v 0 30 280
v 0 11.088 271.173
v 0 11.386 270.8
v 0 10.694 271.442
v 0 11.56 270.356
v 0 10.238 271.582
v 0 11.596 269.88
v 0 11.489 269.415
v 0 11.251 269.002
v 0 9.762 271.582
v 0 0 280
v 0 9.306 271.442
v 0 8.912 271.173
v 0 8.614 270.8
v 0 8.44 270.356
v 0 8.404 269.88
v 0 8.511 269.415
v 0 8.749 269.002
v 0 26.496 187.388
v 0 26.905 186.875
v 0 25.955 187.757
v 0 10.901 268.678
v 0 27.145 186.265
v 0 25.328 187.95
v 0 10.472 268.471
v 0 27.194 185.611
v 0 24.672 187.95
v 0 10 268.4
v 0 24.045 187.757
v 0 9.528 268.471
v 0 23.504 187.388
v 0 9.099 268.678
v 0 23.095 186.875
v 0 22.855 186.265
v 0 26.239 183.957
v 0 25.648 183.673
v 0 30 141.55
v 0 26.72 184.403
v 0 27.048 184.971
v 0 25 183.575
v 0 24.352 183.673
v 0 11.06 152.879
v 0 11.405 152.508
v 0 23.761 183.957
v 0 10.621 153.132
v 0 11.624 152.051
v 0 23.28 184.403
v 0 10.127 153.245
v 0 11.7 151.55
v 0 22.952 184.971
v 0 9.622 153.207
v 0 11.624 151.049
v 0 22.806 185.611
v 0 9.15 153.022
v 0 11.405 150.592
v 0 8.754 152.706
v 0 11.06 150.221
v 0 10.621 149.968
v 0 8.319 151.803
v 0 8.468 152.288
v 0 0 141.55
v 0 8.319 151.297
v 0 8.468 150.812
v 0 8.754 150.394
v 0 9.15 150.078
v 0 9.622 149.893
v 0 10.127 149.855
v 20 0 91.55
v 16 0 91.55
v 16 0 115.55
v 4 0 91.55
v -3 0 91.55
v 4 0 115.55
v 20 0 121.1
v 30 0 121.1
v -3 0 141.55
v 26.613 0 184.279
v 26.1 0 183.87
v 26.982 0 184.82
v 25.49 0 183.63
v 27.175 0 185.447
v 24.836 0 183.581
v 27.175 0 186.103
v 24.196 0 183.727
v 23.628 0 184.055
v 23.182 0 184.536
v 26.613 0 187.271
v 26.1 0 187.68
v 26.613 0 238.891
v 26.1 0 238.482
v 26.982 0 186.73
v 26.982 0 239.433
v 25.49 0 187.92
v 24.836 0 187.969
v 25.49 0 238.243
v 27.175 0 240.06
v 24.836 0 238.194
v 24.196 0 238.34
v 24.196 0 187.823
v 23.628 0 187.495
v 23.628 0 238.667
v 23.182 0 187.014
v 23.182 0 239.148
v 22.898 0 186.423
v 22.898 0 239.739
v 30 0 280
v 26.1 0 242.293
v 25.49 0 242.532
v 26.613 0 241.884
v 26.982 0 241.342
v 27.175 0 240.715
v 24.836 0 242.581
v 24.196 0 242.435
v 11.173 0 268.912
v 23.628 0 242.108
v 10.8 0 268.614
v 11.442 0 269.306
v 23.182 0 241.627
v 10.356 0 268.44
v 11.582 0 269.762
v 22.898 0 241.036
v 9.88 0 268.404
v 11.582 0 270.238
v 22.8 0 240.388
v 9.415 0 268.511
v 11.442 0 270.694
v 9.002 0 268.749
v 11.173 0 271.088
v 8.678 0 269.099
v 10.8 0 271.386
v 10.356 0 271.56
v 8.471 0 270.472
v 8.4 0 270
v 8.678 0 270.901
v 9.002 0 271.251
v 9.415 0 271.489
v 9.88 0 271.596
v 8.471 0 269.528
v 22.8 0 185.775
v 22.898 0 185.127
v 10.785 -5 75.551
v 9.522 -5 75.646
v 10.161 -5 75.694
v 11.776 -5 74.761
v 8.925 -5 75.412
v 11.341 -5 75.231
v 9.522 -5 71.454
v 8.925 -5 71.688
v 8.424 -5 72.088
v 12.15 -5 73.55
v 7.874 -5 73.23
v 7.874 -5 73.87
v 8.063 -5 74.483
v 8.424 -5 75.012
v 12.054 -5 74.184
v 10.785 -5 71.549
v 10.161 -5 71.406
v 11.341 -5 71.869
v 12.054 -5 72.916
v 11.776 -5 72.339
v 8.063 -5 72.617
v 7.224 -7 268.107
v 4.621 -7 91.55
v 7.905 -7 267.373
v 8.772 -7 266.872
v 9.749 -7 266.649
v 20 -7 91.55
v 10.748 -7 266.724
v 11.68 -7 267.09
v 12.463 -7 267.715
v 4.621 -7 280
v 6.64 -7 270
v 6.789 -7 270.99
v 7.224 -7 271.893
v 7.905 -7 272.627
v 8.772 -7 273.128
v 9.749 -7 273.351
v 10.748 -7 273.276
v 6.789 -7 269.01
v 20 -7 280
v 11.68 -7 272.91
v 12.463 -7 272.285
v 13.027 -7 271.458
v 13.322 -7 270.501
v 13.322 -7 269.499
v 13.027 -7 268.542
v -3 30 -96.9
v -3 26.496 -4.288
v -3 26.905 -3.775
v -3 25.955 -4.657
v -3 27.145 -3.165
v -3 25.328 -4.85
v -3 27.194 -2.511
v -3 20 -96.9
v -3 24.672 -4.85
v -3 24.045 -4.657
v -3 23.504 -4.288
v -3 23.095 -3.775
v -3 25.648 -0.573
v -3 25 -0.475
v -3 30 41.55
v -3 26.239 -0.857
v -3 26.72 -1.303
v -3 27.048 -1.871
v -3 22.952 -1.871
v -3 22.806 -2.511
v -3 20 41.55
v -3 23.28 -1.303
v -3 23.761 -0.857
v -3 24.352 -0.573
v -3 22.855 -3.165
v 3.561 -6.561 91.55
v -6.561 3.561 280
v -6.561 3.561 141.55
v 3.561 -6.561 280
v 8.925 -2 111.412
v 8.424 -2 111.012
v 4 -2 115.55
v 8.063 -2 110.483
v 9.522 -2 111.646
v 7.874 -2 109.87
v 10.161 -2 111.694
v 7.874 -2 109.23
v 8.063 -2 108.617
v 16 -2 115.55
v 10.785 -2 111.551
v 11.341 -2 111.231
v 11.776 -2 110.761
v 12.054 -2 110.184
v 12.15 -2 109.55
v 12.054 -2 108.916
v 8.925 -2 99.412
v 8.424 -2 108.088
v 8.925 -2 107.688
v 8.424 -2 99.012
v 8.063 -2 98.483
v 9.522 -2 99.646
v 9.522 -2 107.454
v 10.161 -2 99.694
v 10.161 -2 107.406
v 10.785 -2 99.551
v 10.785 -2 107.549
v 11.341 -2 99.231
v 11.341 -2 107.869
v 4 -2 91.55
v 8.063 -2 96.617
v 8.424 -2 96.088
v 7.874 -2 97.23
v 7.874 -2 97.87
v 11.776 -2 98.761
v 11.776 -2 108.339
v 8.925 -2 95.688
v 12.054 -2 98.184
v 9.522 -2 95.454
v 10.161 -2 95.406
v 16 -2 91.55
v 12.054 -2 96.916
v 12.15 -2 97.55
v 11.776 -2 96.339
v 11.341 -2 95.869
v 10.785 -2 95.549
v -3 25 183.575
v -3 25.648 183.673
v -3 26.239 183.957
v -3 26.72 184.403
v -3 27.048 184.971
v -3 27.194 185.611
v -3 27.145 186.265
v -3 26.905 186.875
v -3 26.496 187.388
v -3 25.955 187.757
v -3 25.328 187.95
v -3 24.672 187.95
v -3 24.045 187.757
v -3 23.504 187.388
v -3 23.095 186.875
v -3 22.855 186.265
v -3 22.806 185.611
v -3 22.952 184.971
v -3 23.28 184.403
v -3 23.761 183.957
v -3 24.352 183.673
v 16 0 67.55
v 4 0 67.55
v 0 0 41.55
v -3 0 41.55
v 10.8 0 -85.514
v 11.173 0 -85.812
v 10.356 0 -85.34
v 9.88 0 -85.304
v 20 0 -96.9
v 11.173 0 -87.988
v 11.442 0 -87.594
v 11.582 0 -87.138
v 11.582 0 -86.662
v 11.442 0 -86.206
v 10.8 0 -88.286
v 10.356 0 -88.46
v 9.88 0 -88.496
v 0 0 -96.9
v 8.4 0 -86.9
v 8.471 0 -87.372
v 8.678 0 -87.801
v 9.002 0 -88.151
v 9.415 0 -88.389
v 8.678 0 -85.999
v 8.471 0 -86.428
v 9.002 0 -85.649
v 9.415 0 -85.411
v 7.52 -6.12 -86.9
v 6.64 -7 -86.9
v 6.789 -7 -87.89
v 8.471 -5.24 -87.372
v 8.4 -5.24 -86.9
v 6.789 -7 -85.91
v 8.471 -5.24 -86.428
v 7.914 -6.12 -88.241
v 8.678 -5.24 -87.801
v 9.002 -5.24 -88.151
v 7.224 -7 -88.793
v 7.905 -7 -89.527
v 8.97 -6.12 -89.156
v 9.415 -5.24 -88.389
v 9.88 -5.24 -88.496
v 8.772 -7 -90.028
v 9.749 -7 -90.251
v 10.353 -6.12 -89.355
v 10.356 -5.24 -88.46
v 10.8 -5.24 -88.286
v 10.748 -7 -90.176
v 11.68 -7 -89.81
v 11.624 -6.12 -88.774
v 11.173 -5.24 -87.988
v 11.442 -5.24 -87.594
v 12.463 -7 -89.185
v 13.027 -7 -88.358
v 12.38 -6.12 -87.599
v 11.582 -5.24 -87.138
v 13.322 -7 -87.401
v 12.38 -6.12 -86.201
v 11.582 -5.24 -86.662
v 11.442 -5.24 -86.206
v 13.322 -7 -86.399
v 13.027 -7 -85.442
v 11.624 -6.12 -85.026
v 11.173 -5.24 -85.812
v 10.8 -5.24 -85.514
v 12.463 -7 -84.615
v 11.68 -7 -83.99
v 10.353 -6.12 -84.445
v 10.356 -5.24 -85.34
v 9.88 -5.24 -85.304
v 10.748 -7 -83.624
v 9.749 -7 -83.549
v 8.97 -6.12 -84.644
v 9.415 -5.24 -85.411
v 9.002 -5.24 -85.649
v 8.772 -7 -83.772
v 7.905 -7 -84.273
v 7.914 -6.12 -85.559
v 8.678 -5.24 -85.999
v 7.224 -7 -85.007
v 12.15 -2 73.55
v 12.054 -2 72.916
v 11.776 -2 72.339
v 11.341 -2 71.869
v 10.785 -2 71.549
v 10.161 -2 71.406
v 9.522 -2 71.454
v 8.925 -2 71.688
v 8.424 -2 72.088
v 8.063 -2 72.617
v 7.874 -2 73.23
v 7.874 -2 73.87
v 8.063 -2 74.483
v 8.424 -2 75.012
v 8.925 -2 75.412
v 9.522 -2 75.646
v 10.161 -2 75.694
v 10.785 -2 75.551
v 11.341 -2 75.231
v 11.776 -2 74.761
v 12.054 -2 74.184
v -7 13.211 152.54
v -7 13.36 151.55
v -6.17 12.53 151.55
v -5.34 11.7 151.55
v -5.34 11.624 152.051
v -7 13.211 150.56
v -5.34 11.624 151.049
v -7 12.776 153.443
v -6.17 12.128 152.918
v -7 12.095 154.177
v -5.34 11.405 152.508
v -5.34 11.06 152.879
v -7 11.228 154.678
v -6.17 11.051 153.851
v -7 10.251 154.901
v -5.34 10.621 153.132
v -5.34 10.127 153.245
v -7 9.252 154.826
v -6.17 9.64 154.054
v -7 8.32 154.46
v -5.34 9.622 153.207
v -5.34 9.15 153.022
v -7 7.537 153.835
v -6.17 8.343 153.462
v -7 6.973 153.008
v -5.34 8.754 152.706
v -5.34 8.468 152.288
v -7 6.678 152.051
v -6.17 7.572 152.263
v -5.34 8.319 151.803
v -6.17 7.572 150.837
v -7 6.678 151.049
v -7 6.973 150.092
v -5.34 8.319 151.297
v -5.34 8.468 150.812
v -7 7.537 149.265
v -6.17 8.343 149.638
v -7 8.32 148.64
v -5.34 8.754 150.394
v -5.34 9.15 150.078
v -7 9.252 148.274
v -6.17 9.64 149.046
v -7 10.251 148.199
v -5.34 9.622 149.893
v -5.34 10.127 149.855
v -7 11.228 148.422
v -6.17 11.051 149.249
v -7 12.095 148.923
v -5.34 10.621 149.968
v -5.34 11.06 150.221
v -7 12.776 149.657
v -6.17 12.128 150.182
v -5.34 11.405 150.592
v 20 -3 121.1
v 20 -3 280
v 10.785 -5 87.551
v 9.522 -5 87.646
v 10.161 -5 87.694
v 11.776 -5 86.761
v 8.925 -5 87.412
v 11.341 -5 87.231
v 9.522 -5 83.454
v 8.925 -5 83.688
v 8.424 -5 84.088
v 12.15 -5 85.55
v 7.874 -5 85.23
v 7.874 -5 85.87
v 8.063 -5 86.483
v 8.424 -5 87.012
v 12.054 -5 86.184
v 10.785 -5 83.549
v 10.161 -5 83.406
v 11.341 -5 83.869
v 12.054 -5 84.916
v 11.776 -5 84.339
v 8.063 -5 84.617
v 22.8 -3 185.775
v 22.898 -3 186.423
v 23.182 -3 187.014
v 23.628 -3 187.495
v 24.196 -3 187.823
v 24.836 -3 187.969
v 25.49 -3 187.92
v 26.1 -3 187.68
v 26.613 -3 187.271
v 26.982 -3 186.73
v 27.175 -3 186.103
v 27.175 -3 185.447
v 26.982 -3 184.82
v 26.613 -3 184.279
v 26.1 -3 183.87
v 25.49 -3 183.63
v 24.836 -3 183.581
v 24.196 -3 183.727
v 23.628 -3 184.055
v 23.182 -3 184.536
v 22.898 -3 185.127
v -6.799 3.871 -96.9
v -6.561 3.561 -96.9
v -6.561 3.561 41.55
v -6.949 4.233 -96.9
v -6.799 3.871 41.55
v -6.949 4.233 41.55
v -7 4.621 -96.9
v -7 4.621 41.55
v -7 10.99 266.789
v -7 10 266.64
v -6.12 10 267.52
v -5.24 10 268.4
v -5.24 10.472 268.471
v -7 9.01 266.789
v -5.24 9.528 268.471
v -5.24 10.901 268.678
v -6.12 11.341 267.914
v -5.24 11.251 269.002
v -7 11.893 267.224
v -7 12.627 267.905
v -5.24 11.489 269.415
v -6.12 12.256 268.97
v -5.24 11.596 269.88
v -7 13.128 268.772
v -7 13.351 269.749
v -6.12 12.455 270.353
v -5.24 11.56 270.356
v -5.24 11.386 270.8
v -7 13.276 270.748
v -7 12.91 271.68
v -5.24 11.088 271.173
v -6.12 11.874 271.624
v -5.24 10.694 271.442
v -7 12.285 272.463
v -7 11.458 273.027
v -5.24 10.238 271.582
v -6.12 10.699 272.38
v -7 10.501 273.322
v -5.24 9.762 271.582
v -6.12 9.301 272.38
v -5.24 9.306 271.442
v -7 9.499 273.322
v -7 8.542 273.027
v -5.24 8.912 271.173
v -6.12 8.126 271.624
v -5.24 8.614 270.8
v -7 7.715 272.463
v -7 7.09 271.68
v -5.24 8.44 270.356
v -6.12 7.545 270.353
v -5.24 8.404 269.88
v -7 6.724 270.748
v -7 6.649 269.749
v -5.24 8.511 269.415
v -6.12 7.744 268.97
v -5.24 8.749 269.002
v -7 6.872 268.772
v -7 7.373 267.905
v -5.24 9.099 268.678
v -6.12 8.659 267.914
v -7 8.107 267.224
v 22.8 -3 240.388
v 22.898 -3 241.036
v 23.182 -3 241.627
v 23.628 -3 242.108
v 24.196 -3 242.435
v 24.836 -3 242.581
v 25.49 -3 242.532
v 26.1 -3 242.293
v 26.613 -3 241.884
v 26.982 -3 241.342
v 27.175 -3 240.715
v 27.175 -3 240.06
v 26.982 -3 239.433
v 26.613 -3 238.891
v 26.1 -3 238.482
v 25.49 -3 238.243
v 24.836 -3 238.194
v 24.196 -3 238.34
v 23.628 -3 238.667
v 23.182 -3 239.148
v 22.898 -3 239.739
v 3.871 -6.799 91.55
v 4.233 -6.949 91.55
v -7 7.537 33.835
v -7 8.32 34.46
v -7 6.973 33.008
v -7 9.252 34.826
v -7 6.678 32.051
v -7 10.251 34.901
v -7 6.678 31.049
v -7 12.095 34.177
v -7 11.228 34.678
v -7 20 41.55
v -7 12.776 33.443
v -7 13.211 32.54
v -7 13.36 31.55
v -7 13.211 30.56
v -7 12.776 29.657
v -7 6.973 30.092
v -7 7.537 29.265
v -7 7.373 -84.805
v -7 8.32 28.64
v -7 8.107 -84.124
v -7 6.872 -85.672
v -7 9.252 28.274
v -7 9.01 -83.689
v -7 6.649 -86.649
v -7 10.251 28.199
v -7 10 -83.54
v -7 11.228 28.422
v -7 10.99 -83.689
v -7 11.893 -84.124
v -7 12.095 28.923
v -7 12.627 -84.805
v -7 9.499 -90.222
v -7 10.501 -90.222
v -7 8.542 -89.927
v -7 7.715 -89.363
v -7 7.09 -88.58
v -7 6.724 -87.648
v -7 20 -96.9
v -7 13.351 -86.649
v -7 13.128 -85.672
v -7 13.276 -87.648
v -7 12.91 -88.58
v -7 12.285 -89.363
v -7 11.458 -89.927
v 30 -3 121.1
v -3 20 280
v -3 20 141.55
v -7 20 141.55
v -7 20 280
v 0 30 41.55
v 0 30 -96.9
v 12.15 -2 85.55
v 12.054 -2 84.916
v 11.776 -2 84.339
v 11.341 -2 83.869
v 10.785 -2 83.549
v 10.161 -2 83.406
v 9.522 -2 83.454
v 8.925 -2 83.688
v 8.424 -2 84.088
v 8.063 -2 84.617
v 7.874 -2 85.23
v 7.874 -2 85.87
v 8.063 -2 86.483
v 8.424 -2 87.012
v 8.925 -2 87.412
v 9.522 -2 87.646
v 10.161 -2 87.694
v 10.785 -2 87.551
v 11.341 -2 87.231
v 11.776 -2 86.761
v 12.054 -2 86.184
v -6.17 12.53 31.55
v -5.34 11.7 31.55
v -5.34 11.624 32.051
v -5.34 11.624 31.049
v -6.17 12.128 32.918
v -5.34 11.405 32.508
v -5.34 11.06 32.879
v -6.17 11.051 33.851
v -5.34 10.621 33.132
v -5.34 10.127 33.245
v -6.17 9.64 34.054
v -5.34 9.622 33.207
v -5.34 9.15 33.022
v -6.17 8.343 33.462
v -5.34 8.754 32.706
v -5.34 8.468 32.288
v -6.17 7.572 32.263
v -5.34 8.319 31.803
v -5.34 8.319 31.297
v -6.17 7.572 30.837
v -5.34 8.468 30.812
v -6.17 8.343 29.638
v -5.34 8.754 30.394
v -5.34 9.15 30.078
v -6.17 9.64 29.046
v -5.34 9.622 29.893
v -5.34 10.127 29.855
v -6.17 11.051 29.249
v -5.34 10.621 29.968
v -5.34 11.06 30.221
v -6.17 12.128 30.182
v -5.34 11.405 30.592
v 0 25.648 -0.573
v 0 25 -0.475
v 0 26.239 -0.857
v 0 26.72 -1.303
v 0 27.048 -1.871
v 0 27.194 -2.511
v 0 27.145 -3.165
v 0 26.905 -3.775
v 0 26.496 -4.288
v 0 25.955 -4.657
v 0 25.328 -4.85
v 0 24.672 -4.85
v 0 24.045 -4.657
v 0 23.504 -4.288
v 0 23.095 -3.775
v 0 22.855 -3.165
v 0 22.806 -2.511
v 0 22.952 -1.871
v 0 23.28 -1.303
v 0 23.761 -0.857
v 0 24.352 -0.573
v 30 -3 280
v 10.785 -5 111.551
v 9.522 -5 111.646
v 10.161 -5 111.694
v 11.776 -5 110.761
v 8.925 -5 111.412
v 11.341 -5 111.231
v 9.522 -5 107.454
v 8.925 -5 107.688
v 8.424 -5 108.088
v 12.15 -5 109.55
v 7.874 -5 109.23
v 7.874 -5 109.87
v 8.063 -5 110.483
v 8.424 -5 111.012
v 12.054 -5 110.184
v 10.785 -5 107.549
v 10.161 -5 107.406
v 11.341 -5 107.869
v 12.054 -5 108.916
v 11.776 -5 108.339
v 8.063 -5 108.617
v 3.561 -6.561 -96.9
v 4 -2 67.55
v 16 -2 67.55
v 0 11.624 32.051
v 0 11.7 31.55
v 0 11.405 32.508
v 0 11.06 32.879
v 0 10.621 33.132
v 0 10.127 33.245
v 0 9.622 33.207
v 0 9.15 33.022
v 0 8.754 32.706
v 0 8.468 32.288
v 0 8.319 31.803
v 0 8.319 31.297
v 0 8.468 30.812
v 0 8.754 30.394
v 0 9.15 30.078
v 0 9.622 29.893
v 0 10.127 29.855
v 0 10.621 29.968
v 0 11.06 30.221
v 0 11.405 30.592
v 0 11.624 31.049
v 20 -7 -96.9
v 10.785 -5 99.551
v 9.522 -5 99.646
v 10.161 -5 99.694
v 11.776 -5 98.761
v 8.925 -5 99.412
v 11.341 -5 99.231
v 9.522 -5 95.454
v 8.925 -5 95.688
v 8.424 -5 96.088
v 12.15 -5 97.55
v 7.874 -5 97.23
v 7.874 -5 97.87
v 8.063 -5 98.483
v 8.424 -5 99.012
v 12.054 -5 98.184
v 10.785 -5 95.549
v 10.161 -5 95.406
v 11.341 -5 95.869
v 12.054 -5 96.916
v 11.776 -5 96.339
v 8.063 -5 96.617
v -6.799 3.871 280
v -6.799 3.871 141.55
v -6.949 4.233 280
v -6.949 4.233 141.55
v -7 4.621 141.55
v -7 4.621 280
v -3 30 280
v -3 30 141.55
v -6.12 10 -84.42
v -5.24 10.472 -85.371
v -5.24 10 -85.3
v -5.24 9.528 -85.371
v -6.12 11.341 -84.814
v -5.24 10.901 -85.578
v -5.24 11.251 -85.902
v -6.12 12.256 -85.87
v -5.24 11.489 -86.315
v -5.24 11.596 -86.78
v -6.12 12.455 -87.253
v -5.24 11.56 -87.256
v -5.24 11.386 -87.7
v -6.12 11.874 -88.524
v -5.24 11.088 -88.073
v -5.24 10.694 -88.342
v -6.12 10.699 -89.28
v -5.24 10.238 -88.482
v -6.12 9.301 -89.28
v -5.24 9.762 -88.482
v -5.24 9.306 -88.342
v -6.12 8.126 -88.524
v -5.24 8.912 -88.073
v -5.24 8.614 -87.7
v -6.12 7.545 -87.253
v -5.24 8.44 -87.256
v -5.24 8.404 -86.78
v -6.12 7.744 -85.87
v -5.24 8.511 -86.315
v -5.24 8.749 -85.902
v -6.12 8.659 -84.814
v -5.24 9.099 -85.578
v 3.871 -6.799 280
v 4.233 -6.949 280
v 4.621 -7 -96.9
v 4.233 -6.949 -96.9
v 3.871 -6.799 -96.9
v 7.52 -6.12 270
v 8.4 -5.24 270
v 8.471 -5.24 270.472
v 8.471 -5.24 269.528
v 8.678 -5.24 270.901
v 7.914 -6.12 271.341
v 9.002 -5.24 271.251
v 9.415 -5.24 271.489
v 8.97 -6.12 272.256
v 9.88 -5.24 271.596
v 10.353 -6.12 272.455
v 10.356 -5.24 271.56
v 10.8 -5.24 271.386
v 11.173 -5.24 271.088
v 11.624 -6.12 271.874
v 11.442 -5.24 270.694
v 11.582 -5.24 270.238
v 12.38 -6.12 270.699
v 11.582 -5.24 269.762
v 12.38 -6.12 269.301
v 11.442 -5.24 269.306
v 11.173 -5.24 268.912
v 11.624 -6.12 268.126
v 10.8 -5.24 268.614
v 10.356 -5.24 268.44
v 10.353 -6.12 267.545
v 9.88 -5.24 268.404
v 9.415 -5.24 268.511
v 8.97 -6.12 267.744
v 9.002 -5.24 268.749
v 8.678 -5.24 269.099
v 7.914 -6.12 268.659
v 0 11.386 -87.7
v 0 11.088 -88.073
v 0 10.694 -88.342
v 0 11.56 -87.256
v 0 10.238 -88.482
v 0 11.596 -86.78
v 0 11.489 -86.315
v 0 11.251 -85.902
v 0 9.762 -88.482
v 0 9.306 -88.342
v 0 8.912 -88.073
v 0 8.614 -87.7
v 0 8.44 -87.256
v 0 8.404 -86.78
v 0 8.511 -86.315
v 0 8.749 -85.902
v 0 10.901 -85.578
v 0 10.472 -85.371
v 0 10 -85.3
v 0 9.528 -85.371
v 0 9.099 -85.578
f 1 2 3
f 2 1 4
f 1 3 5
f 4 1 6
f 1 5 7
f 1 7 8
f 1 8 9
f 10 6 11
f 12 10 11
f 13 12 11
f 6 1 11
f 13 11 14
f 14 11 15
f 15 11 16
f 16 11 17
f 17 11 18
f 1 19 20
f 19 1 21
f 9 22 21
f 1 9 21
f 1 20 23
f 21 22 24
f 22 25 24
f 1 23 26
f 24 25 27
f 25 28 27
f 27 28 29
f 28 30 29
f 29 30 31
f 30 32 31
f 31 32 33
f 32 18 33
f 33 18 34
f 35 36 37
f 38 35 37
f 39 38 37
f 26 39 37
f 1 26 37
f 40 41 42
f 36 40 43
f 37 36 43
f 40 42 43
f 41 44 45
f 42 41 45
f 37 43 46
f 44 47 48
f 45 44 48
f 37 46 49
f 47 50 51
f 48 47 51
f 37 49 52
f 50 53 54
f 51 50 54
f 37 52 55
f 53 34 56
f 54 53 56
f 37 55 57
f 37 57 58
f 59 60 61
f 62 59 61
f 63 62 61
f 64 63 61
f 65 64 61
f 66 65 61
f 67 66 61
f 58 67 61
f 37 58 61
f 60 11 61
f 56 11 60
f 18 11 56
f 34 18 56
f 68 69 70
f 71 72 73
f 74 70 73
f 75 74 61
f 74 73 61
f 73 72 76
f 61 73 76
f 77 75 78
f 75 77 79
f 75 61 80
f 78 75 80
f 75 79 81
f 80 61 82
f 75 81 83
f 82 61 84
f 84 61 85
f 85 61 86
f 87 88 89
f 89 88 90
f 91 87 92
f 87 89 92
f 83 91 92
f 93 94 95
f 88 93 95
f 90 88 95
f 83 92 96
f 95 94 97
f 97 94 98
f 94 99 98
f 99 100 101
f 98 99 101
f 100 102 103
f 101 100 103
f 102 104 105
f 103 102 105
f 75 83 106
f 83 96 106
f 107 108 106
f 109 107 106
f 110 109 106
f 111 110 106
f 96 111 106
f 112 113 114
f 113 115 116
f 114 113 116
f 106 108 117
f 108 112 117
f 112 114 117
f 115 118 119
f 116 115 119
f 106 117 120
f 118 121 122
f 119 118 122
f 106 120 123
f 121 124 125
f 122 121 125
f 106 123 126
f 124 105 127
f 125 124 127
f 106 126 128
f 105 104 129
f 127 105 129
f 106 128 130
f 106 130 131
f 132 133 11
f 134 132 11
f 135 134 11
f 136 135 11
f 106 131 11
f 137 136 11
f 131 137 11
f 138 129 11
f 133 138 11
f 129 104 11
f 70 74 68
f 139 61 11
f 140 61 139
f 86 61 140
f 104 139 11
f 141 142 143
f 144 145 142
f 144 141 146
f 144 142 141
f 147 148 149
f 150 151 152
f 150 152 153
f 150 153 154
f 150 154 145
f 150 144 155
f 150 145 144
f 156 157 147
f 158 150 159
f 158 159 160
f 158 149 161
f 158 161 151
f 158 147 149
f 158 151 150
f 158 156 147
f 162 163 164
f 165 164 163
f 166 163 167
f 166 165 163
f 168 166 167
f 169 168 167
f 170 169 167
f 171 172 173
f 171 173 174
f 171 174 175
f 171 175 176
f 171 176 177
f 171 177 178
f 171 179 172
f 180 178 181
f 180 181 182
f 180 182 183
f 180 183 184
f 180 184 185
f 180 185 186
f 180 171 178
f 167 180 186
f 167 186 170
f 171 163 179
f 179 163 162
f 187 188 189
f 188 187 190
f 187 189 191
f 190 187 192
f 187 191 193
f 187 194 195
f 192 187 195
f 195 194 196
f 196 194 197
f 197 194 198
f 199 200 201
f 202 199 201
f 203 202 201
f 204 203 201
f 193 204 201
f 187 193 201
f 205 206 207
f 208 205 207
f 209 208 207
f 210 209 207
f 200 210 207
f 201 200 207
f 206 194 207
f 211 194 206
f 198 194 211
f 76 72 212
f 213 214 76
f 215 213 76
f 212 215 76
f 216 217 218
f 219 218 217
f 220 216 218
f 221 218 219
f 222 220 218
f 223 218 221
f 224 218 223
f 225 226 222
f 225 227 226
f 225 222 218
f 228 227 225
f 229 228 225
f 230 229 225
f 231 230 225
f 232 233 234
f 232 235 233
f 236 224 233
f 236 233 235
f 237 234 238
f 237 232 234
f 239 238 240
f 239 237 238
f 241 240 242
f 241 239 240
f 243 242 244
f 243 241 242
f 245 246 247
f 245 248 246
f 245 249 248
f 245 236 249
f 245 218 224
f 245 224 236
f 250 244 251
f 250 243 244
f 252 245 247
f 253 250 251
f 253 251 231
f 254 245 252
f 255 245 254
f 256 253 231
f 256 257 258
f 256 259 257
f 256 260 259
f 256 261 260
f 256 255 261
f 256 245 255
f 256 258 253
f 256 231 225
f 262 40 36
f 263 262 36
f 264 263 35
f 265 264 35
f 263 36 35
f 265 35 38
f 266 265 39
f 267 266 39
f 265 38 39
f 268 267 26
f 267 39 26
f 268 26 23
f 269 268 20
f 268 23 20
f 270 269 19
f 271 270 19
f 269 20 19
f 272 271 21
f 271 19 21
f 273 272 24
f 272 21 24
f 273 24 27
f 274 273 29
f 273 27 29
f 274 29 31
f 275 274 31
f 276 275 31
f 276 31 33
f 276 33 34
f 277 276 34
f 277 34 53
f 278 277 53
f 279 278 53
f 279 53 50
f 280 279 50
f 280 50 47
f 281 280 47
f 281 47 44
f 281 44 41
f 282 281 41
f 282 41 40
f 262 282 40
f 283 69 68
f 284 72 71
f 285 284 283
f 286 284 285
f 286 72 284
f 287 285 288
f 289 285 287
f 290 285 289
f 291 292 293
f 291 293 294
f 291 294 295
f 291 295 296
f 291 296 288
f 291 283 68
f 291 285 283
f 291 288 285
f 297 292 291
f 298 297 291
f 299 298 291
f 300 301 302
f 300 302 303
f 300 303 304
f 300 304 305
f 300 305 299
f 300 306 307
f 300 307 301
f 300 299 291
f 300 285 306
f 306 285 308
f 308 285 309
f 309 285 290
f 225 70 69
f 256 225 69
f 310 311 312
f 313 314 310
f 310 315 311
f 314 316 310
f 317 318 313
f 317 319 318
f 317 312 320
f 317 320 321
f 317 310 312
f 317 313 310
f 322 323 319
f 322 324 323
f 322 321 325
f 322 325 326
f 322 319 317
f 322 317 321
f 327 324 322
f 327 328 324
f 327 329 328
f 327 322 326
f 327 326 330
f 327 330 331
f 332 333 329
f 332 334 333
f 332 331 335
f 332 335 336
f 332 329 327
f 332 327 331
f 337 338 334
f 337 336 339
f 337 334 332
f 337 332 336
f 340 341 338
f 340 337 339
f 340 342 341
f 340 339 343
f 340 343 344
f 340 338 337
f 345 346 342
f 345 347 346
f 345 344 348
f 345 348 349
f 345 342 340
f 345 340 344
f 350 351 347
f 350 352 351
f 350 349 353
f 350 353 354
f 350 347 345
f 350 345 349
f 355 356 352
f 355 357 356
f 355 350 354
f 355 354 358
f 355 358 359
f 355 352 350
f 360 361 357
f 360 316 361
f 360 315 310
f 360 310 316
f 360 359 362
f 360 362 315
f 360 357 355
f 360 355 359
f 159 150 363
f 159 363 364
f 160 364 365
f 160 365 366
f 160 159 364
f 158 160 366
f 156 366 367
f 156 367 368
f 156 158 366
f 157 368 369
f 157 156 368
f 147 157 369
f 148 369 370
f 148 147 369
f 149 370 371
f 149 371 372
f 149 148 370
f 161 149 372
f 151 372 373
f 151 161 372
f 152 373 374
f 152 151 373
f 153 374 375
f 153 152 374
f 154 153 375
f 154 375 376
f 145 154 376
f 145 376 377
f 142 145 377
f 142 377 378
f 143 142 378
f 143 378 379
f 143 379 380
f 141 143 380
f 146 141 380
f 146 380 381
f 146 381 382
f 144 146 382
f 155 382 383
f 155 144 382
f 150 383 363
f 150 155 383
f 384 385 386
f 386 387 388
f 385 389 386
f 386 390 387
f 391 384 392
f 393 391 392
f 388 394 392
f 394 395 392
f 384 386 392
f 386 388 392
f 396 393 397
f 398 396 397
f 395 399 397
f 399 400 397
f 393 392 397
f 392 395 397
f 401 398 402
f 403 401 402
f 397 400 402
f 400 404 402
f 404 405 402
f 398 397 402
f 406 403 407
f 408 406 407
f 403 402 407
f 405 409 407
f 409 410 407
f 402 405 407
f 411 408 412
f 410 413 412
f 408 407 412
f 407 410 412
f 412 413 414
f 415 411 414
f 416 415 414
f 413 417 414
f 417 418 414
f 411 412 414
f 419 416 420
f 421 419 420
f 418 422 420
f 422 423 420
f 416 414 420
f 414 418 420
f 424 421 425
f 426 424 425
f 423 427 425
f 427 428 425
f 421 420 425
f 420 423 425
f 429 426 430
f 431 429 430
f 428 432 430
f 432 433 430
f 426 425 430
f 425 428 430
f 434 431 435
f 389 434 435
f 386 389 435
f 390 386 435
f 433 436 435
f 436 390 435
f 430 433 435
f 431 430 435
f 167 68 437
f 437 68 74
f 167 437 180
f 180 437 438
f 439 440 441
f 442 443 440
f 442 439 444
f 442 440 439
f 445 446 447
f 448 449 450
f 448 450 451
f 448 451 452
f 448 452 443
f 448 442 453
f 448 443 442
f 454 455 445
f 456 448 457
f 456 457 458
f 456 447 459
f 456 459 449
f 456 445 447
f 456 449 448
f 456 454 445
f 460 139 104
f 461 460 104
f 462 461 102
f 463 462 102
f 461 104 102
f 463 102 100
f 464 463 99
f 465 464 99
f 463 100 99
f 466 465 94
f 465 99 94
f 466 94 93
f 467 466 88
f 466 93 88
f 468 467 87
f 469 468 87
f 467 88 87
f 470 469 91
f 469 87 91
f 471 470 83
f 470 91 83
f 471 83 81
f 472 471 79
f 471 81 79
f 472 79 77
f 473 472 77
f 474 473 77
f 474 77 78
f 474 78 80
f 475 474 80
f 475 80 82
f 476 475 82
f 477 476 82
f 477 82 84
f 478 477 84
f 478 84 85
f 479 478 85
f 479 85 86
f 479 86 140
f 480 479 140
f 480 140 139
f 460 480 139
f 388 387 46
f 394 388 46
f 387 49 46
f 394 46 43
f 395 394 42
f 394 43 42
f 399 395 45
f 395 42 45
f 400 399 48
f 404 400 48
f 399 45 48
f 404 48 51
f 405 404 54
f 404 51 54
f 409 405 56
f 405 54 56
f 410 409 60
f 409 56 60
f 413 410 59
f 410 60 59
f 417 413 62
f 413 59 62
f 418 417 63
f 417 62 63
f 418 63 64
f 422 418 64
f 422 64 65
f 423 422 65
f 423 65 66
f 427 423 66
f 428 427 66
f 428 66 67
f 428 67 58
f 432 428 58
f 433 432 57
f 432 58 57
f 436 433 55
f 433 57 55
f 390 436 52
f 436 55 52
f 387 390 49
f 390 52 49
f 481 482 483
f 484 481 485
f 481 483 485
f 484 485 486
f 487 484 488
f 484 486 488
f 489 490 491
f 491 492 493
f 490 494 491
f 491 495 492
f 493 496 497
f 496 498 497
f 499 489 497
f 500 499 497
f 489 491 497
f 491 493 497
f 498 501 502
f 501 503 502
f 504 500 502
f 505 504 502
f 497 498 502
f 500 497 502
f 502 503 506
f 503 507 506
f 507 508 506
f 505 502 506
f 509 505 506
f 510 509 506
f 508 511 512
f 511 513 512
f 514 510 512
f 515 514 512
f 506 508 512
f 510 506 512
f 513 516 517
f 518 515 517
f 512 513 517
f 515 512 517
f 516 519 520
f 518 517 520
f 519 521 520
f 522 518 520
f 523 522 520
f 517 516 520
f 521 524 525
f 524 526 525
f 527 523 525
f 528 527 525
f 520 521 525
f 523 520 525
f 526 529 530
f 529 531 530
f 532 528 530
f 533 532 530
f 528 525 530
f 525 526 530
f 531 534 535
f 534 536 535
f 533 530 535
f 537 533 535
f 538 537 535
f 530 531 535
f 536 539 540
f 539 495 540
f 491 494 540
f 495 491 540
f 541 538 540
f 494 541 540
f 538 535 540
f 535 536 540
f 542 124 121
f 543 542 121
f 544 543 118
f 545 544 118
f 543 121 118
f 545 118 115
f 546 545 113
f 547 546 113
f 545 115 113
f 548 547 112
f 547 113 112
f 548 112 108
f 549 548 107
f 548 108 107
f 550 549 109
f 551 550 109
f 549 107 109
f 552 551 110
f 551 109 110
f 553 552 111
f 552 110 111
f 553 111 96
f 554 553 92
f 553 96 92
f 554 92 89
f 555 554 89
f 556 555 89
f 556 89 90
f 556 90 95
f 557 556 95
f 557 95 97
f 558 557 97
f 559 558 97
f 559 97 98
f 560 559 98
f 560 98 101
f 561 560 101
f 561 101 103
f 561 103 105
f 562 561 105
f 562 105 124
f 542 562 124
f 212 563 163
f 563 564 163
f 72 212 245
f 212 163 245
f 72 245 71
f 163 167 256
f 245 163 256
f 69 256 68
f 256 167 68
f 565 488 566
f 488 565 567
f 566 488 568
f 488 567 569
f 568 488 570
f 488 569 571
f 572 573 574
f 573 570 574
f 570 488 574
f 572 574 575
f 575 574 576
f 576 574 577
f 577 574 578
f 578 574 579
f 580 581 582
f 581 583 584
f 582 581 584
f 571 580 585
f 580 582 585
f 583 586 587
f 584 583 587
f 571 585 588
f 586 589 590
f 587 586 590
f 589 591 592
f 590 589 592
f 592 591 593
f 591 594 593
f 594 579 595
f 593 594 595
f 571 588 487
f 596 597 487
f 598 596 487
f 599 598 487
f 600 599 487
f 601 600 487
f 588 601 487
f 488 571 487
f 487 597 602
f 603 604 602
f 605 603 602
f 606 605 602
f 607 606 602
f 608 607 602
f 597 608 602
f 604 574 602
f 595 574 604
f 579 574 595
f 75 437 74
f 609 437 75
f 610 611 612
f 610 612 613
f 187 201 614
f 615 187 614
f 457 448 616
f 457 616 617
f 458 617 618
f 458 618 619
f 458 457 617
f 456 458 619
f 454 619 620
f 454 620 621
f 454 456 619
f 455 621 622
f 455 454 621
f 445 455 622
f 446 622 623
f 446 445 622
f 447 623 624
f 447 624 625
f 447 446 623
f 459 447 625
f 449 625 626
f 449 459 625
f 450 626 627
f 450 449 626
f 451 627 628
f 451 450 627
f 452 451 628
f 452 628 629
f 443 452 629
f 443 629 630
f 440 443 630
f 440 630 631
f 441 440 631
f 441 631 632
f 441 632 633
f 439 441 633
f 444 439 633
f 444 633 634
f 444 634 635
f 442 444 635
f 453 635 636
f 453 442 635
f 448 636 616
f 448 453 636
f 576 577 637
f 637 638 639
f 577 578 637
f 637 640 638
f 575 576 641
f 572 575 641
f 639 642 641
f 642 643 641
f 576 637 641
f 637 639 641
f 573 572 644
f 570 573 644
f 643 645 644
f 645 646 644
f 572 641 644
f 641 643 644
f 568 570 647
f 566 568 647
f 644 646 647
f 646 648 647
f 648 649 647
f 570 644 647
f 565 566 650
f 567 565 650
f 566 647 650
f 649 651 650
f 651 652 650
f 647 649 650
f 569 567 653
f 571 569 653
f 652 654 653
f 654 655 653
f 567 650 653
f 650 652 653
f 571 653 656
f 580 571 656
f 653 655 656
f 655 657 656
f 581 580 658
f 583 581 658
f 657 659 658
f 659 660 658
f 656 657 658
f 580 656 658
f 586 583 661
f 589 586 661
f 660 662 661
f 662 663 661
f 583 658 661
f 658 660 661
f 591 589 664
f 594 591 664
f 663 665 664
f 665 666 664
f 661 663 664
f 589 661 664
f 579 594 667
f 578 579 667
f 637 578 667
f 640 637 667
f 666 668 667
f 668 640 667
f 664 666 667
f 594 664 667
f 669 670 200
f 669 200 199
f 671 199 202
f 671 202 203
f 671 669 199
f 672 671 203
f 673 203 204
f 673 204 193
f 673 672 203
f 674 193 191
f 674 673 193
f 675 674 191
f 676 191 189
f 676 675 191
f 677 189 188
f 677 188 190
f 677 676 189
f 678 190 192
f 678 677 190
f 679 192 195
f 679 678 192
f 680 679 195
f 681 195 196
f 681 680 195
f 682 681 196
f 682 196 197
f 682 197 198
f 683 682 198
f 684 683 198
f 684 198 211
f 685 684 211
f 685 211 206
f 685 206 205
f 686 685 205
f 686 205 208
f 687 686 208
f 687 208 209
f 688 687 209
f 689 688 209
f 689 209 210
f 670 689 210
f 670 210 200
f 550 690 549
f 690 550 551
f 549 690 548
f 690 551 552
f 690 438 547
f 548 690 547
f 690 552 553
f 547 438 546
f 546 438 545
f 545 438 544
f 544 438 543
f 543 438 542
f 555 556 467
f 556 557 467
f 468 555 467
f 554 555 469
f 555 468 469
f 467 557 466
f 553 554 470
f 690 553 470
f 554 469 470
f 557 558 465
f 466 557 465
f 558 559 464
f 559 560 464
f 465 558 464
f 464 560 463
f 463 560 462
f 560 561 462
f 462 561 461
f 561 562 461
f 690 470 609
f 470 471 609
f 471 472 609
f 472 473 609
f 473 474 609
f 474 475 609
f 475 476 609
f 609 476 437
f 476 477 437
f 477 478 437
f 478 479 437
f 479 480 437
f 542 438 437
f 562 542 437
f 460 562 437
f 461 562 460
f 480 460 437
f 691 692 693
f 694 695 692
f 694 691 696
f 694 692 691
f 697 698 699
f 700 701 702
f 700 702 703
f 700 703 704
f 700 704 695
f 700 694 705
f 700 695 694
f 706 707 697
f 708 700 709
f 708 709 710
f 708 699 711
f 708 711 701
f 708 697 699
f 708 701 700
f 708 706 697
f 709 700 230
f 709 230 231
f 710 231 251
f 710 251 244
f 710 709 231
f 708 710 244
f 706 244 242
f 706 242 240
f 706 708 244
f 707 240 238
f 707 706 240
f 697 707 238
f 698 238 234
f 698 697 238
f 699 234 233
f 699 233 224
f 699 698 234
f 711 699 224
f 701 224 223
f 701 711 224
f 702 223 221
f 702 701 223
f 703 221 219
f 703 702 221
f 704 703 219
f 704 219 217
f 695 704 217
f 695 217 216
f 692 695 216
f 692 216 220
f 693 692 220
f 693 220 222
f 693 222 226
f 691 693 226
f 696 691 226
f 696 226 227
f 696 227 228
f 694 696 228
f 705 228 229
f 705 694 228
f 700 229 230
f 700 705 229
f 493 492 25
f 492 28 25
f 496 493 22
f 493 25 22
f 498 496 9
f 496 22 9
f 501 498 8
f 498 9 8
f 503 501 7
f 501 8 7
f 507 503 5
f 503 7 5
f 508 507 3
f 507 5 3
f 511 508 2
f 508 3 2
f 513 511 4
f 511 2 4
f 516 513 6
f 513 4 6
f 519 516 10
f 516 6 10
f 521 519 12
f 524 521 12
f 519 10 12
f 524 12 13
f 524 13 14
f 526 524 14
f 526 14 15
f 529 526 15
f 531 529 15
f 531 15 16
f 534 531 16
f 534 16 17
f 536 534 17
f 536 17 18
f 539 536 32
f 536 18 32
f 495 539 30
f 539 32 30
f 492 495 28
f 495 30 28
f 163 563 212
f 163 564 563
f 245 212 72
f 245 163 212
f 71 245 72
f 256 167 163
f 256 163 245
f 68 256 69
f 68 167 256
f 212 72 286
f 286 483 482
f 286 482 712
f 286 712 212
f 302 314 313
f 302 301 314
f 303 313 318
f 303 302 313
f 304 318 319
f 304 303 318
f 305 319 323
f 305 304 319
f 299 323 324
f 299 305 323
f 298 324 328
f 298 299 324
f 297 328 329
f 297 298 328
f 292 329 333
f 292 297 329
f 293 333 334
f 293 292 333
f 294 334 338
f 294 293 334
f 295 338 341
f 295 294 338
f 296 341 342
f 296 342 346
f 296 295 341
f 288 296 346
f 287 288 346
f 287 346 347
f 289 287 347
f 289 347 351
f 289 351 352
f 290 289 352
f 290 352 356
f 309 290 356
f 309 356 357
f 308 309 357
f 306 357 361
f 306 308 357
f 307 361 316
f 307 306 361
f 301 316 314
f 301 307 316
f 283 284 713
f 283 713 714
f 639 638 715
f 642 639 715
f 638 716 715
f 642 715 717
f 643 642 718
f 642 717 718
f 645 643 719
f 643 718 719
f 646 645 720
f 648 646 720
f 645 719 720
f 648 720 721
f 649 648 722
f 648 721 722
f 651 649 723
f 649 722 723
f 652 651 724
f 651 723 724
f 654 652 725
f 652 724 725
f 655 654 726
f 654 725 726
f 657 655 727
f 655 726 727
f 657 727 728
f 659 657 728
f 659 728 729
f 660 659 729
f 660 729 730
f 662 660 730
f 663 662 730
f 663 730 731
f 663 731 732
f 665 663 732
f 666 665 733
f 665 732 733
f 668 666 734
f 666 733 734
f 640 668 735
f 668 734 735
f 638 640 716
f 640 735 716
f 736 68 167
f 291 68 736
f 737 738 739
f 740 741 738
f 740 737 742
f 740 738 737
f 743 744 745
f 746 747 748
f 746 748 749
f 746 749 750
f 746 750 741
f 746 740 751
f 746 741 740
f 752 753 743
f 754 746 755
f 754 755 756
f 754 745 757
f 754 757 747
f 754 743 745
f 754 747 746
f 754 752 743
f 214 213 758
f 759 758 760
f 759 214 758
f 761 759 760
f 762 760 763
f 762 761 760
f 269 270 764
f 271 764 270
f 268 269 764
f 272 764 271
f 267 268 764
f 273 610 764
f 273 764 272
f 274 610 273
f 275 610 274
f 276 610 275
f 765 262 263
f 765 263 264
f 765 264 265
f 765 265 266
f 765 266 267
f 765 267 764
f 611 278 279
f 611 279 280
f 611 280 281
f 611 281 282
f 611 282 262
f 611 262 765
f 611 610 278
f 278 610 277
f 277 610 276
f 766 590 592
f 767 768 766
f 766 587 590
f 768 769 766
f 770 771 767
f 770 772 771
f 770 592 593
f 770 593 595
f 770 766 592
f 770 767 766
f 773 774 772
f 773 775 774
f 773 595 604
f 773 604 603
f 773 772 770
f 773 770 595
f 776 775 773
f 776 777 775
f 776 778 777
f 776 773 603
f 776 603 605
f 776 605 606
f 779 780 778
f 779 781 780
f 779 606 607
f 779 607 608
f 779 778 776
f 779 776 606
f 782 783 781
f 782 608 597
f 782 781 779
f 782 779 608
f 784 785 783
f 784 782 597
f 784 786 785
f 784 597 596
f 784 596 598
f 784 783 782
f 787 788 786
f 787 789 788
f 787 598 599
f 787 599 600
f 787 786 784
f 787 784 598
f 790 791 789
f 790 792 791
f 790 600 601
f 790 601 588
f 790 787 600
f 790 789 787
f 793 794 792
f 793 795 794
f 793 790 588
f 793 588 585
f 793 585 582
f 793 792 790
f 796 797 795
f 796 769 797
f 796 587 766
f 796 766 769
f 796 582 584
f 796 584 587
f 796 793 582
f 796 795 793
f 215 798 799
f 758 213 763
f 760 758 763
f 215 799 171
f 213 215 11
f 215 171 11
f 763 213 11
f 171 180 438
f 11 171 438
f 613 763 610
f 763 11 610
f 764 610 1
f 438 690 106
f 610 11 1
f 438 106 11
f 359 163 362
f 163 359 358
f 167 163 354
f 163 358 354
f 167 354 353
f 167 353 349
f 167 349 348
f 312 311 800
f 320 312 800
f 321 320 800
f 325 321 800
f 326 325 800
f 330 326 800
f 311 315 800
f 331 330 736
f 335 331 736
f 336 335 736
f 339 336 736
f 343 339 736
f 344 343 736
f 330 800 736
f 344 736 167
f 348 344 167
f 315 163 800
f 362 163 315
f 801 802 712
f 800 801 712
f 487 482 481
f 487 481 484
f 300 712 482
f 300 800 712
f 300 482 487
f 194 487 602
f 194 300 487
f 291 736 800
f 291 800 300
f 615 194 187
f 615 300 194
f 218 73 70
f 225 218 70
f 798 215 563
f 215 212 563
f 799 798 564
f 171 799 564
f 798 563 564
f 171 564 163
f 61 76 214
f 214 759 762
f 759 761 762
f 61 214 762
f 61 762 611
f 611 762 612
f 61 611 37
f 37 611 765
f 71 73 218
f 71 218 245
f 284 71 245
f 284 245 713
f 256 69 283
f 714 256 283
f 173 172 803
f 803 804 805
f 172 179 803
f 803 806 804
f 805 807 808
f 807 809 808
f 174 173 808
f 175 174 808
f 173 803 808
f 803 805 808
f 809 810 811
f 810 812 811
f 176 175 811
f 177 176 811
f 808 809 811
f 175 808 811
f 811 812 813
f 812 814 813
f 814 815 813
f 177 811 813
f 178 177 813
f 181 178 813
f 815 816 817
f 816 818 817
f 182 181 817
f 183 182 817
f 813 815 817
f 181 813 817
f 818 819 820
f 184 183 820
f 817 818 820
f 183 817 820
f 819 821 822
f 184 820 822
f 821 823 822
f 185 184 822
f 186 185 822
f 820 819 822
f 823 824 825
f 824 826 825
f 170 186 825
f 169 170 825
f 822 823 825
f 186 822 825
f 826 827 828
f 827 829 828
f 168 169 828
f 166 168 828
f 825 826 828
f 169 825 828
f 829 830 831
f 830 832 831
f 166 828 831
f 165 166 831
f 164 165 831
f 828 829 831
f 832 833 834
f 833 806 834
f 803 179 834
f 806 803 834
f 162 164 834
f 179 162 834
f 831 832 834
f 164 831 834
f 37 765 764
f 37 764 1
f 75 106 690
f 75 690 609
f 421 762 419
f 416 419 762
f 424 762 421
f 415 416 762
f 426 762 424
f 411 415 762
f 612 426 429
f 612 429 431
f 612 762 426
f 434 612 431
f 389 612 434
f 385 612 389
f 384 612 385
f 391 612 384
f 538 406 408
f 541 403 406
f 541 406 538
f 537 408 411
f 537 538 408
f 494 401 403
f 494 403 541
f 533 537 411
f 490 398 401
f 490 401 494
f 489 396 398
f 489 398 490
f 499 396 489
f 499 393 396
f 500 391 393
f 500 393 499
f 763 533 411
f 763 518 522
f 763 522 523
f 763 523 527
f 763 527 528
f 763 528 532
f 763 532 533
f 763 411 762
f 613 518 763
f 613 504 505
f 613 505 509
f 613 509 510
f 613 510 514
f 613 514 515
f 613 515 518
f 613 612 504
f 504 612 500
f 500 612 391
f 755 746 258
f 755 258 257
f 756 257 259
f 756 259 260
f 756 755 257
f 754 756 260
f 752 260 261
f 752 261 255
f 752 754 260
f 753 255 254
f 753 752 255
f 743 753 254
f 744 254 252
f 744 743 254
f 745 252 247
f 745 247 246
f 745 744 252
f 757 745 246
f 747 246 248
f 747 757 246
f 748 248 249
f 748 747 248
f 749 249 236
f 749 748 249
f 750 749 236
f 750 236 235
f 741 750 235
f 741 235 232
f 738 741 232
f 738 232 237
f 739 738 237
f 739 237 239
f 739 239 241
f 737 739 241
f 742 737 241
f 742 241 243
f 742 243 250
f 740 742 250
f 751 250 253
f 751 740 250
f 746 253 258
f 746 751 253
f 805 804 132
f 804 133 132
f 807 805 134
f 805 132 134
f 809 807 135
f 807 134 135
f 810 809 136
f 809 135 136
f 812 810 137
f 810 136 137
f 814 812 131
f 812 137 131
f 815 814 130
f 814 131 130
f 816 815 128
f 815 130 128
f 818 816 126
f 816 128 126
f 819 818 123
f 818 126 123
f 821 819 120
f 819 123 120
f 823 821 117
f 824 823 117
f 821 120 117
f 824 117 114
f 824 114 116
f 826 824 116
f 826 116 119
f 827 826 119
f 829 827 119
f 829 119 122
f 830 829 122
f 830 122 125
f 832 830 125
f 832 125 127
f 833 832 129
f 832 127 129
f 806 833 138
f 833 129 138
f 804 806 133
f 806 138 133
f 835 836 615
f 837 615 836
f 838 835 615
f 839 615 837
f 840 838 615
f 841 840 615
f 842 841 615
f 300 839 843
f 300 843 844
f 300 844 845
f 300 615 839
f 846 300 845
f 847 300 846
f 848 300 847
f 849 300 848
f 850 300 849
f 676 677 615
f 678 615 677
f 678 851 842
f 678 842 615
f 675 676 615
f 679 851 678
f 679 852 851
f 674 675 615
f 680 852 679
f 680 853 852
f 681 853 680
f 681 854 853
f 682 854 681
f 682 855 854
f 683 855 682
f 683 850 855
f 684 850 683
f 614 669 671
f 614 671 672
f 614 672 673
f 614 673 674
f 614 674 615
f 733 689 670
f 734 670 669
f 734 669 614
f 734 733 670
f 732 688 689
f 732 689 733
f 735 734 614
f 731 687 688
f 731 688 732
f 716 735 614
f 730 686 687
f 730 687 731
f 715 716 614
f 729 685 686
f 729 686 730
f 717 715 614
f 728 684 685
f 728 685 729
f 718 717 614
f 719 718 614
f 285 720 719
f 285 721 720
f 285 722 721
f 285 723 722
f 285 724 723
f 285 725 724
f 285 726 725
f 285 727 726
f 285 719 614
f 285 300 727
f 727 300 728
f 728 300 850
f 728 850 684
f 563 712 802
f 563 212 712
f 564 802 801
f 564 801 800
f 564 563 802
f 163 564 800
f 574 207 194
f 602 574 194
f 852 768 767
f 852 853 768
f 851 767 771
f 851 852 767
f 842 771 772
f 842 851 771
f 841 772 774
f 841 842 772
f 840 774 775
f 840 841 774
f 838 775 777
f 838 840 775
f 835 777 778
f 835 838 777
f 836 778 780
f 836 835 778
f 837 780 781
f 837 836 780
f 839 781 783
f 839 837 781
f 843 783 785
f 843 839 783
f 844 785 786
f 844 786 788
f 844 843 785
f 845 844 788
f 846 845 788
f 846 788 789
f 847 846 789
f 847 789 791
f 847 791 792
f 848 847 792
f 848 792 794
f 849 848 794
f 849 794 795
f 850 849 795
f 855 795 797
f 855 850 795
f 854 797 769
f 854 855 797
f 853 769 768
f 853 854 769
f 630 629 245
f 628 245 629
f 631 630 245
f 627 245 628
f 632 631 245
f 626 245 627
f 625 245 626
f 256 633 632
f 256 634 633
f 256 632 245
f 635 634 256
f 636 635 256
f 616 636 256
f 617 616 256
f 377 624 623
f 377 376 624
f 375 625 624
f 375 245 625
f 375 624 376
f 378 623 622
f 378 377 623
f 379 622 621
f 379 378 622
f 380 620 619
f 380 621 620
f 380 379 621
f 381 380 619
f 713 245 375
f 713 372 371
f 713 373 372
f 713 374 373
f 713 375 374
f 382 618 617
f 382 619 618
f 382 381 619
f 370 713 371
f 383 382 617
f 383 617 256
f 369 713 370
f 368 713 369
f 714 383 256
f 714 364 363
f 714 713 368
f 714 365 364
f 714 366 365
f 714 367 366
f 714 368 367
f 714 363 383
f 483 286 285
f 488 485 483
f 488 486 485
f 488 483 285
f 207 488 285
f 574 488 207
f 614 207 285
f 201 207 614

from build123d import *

# Parameters (mm, degrees)
BOSS_EXTRUDE1_DEPTH                  = 188.45
FILLET1_R                            = 1.5
SKETCH6_W                            = 188.45
SKETCH6_H                            = 3
BOSS_EXTRUDE2_DEPTH                  = 10
SKETCH7_W                            = 13
SKETCH7_H                            = 188.45
BOSS_EXTRUDE3_DEPTH                  = 4
SKETCH8_W                            = 3
SKETCH8_H                            = 188.45
BOSS_EXTRUDE4_DEPTH                  = 10
SKETCH9_W                            = 188.45
SKETCH9_H                            = 13
BOSS_EXTRUDE5_DEPTH                  = 4
CSK_FOR_M3_SFHCS1_D                  = 3.2
CSK_FOR_M3_SFHCS1_CSINK_D            = 6.72
CSK_FOR_M3_SFHCS1_CSINK_ANGLE        = 90
CSK_FOR_M3_SFHCS2_D                  = 3.2
CSK_FOR_M3_SFHCS2_CSINK_D            = 6.72
CSK_FOR_M3_SFHCS2_CSINK_ANGLE        = 90
F_4_4_4_4_DIAMETER_HOLE1_D           = 4.4
F_4_4_4_4_DIAMETER_HOLE1_DEPTH       = 10
F_4_4_4_4_DIAMETER_HOLE1_TIP         = 1.321893362
F_4_4_4_4_DIAMETER_HOLE2_D           = 4.4
F_4_4_4_4_DIAMETER_HOLE2_DEPTH       = 10
F_4_4_4_4_DIAMETER_HOLE2_TIP         = 1.321893362
SKETCH26_W                           = 50
SKETCH26_H                           = 30
CUT_EXTRUDE4_DEPTH                   = 10
SKETCH14_W                           = 10
SKETCH14_H                           = 218
CUT_EXTRUDE1_DEPTH                   = 10
SKETCH22_W                           = 12
SKETCH22_H                           = 48
CUT_EXTRUDE3_DEPTH                   = 2
F_4_3_START                          = -5
F_4_3_4_3_DIAMETER_HOLE2_OUTLINE_R   = 2.15
F_4_3_4_3_DIAMETER_HOLE2_DEPTH       = 3
F_4_3_4_3_DIAMETER_HOLE2_2_OUTLINE_R = 2.15
F_4_3_4_3_DIAMETER_HOLE2_2_DEPTH     = 3


with BuildPart() as part:
    # Sketch1 → Boss-Extrude1 (new body)
    with BuildSketch(Plane.XY.offset(280)):
        Polygon((-7, 4), (4, -7), (7, -7), (7, -3), (20, -3), (20, 0), (0, 0), (0, 20), (-3, 20), (-3, 7), (-7, 7), align=None)
    extrude(amount=-BOSS_EXTRUDE1_DEPTH)

    # Fillet1
    fillet1_edges = [part.edges().sort_by_distance(p)[0] for p in [
        (4, -7, 185.775),
        (-7, 4, 185.775),
    ]]
    fillet(fillet1_edges, radius=FILLET1_R)

    # Sketch6 → Boss-Extrude2 (add)
    with BuildSketch(Plane(origin=(20, 0, 0), x_dir=(0, 0, -1), z_dir=(1, 0, 0))):
        with Locations((-185.775, -1.5)):
            Rectangle(SKETCH6_W, SKETCH6_H)
    extrude(amount=BOSS_EXTRUDE2_DEPTH)

    # Sketch7 → Boss-Extrude3 (add)
    with BuildSketch(Plane.XZ.offset(3)):
        with Locations((13.5, 185.775)):
            Rectangle(SKETCH7_W, SKETCH7_H)
    extrude(amount=BOSS_EXTRUDE3_DEPTH)

    # Sketch8 → Boss-Extrude4 (add)
    with BuildSketch(Plane(origin=(0, 20, 0), x_dir=(1, 0, 0), z_dir=(0, 1, 0))):
        with Locations((-1.5, -185.775)):
            Rectangle(SKETCH8_W, SKETCH8_H)
    extrude(amount=BOSS_EXTRUDE4_DEPTH)

    # Sketch9 → Boss-Extrude5 (add)
    with BuildSketch(Plane.ZY.offset(3)):
        with Locations((185.775, 13.5)):
            Rectangle(SKETCH9_W, SKETCH9_H)
    extrude(amount=BOSS_EXTRUDE5_DEPTH)

    # CSK for M3 SFHCS1 (through all)
    with Locations(Plane.XZ.offset(7)):
        with Locations((10, 270)):
            CounterSinkHole(CSK_FOR_M3_SFHCS1_D / 2, CSK_FOR_M3_SFHCS1_CSINK_D / 2, counter_sink_angle=CSK_FOR_M3_SFHCS1_CSINK_ANGLE)

    # CSK for M3 SFHCS2 (through all)
    with Locations(Plane.ZY.offset(7)):
        with Locations((270, 10)):
            CounterSinkHole(CSK_FOR_M3_SFHCS2_D / 2, CSK_FOR_M3_SFHCS2_CSINK_D / 2, counter_sink_angle=CSK_FOR_M3_SFHCS2_CSINK_ANGLE)

    # Ø4.4 (4.4) Diameter Hole1
    with Locations(Plane.ZY.offset(3)):
        with Locations((185.775, 25)):
            Hole(F_4_4_4_4_DIAMETER_HOLE1_D / 2, depth=F_4_4_4_4_DIAMETER_HOLE1_DEPTH)
            with Locations((0, 0, -(F_4_4_4_4_DIAMETER_HOLE1_DEPTH + F_4_4_4_4_DIAMETER_HOLE1_TIP / 2))):  # 118° drill point
                Cone(0, F_4_4_4_4_DIAMETER_HOLE1_D / 2, F_4_4_4_4_DIAMETER_HOLE1_TIP, mode=Mode.SUBTRACT)

    # Ø4.4 (4.4) Diameter Hole2
    with Locations(Plane.XZ.offset(3)):
        with Locations((25, 240.3875), (25, 185.775)):
            Hole(F_4_4_4_4_DIAMETER_HOLE2_D / 2, depth=F_4_4_4_4_DIAMETER_HOLE2_DEPTH)
            with Locations((0, 0, -(F_4_4_4_4_DIAMETER_HOLE2_DEPTH + F_4_4_4_4_DIAMETER_HOLE2_TIP / 2))):  # 118° drill point
                Cone(0, F_4_4_4_4_DIAMETER_HOLE2_D / 2, F_4_4_4_4_DIAMETER_HOLE2_TIP, mode=Mode.SUBTRACT)

    # Sketch26 → Cut-Extrude4 (cut)
    with BuildSketch(Plane.ZY.offset(7)):
        with Locations((116.55, 15)):
            Rectangle(SKETCH26_W, SKETCH26_H)
    extrude(amount=-CUT_EXTRUDE4_DEPTH, mode=Mode.SUBTRACT)


with BuildPart() as body_2:
    # Mirror1: read off the stored shape, not the designer's step
    # Mirror1: mirrored copy
    add(part.part.mirror(Plane.XY.offset(91.55)))


with BuildPart() as cut_extrude1_tool:
    # Sketch14 → Cut-Extrude1 (new body)
    with BuildSketch(Plane.XZ.offset(3)):
        with Locations((25, 12.1)):
            Rectangle(SKETCH14_W, SKETCH14_H)
    extrude(amount=-CUT_EXTRUDE1_DEPTH)


with BuildPart() as part_1:
    add(part.part)

    # Cut-Extrude1: cut by cut_extrude1_tool
    add(cut_extrude1_tool.part, mode=Mode.SUBTRACT)


with BuildPart() as body_2_1:
    add(body_2.part)

    # Cut-Extrude1: cut by cut_extrude1_tool
    add(cut_extrude1_tool.part, mode=Mode.SUBTRACT)


with BuildPart() as cut_extrude3_tool:
    # Sketch22 → Cut-Extrude3 (new body)
    with BuildSketch(Plane(origin=(0, 0, 0), x_dir=(1, 0, 0), z_dir=(0, 1, 0))):
        with Locations((10, -91.55)):
            Rectangle(SKETCH22_W, SKETCH22_H)
    extrude(amount=-CUT_EXTRUDE3_DEPTH)


with BuildPart() as part_2:
    add(part_1.part)

    # Cut-Extrude3: cut by cut_extrude3_tool
    add(cut_extrude3_tool.part, mode=Mode.SUBTRACT)

    # 4.3 _4.3_ Diameter Hole2 2 outline → 4.3 _4.3_ Diameter Hole2 2 (cut)
    with BuildSketch(Plane(origin=(0, 0, 0), x_dir=(1, 0, 0), z_dir=(0, 1, 0)).offset(F_4_3_START)):
        with Locations((10, -109.55)):
            Circle(F_4_3_4_3_DIAMETER_HOLE2_2_OUTLINE_R)
        with Locations((10, -97.55)):
            Circle(F_4_3_4_3_DIAMETER_HOLE2_2_OUTLINE_R)
    extrude(amount=F_4_3_4_3_DIAMETER_HOLE2_2_DEPTH, mode=Mode.SUBTRACT)

    # CSK for M3 SFHCS3 2 outline → CSK for M3 SFHCS3 2 (revolve, cut)
    with BuildSketch(Plane(origin=(0, 10, 151.55), x_dir=(0, 1, 0), z_dir=(0, 0, -1))):
        Polygon((1.7, -5.34), (1.7, 0), (0, 0), (0, -7), (3.36, -7), align=None)
    revolve(axis=Axis((0, 10, 151.55), (1, 0, 0)), mode=Mode.SUBTRACT)


with BuildPart() as body_2_2:
    add(body_2_1.part)

    # Cut-Extrude3: cut by cut_extrude3_tool
    add(cut_extrude3_tool.part, mode=Mode.SUBTRACT)

    # Ø4.3 (4.3) Diameter Hole2: read off the stored shape, not the designer's step
    # Ø4.3 (4.3) Diameter Hole2 outline → Ø4.3 (4.3) Diameter Hole2 (cut)
    with BuildSketch(Plane(origin=(0, 0, 0), x_dir=(1, 0, 0), z_dir=(0, 1, 0)).offset(F_4_3_START)):
        with Locations((10, -85.55)):
            Circle(F_4_3_4_3_DIAMETER_HOLE2_OUTLINE_R)
        with Locations((10, -73.55)):
            Circle(F_4_3_4_3_DIAMETER_HOLE2_OUTLINE_R)
    extrude(amount=F_4_3_4_3_DIAMETER_HOLE2_DEPTH, mode=Mode.SUBTRACT)

    # CSK for M3 SFHCS3: read off the stored shape, not the designer's step
    # CSK for M3 SFHCS3 outline → CSK for M3 SFHCS3 (revolve, cut)
    with BuildSketch(Plane(origin=(0, 10, 31.55), x_dir=(0, 1, 0), z_dir=(0, 0, -1))):
        Polygon((1.7, -5.34), (1.7, 0), (0, 0), (0, -7), (3.36, -7), align=None)
    revolve(axis=Axis((0, 10, 31.55), (1, 0, 0)), mode=Mode.SUBTRACT)


solid = Compound([part_2.part, body_2_2.part])
